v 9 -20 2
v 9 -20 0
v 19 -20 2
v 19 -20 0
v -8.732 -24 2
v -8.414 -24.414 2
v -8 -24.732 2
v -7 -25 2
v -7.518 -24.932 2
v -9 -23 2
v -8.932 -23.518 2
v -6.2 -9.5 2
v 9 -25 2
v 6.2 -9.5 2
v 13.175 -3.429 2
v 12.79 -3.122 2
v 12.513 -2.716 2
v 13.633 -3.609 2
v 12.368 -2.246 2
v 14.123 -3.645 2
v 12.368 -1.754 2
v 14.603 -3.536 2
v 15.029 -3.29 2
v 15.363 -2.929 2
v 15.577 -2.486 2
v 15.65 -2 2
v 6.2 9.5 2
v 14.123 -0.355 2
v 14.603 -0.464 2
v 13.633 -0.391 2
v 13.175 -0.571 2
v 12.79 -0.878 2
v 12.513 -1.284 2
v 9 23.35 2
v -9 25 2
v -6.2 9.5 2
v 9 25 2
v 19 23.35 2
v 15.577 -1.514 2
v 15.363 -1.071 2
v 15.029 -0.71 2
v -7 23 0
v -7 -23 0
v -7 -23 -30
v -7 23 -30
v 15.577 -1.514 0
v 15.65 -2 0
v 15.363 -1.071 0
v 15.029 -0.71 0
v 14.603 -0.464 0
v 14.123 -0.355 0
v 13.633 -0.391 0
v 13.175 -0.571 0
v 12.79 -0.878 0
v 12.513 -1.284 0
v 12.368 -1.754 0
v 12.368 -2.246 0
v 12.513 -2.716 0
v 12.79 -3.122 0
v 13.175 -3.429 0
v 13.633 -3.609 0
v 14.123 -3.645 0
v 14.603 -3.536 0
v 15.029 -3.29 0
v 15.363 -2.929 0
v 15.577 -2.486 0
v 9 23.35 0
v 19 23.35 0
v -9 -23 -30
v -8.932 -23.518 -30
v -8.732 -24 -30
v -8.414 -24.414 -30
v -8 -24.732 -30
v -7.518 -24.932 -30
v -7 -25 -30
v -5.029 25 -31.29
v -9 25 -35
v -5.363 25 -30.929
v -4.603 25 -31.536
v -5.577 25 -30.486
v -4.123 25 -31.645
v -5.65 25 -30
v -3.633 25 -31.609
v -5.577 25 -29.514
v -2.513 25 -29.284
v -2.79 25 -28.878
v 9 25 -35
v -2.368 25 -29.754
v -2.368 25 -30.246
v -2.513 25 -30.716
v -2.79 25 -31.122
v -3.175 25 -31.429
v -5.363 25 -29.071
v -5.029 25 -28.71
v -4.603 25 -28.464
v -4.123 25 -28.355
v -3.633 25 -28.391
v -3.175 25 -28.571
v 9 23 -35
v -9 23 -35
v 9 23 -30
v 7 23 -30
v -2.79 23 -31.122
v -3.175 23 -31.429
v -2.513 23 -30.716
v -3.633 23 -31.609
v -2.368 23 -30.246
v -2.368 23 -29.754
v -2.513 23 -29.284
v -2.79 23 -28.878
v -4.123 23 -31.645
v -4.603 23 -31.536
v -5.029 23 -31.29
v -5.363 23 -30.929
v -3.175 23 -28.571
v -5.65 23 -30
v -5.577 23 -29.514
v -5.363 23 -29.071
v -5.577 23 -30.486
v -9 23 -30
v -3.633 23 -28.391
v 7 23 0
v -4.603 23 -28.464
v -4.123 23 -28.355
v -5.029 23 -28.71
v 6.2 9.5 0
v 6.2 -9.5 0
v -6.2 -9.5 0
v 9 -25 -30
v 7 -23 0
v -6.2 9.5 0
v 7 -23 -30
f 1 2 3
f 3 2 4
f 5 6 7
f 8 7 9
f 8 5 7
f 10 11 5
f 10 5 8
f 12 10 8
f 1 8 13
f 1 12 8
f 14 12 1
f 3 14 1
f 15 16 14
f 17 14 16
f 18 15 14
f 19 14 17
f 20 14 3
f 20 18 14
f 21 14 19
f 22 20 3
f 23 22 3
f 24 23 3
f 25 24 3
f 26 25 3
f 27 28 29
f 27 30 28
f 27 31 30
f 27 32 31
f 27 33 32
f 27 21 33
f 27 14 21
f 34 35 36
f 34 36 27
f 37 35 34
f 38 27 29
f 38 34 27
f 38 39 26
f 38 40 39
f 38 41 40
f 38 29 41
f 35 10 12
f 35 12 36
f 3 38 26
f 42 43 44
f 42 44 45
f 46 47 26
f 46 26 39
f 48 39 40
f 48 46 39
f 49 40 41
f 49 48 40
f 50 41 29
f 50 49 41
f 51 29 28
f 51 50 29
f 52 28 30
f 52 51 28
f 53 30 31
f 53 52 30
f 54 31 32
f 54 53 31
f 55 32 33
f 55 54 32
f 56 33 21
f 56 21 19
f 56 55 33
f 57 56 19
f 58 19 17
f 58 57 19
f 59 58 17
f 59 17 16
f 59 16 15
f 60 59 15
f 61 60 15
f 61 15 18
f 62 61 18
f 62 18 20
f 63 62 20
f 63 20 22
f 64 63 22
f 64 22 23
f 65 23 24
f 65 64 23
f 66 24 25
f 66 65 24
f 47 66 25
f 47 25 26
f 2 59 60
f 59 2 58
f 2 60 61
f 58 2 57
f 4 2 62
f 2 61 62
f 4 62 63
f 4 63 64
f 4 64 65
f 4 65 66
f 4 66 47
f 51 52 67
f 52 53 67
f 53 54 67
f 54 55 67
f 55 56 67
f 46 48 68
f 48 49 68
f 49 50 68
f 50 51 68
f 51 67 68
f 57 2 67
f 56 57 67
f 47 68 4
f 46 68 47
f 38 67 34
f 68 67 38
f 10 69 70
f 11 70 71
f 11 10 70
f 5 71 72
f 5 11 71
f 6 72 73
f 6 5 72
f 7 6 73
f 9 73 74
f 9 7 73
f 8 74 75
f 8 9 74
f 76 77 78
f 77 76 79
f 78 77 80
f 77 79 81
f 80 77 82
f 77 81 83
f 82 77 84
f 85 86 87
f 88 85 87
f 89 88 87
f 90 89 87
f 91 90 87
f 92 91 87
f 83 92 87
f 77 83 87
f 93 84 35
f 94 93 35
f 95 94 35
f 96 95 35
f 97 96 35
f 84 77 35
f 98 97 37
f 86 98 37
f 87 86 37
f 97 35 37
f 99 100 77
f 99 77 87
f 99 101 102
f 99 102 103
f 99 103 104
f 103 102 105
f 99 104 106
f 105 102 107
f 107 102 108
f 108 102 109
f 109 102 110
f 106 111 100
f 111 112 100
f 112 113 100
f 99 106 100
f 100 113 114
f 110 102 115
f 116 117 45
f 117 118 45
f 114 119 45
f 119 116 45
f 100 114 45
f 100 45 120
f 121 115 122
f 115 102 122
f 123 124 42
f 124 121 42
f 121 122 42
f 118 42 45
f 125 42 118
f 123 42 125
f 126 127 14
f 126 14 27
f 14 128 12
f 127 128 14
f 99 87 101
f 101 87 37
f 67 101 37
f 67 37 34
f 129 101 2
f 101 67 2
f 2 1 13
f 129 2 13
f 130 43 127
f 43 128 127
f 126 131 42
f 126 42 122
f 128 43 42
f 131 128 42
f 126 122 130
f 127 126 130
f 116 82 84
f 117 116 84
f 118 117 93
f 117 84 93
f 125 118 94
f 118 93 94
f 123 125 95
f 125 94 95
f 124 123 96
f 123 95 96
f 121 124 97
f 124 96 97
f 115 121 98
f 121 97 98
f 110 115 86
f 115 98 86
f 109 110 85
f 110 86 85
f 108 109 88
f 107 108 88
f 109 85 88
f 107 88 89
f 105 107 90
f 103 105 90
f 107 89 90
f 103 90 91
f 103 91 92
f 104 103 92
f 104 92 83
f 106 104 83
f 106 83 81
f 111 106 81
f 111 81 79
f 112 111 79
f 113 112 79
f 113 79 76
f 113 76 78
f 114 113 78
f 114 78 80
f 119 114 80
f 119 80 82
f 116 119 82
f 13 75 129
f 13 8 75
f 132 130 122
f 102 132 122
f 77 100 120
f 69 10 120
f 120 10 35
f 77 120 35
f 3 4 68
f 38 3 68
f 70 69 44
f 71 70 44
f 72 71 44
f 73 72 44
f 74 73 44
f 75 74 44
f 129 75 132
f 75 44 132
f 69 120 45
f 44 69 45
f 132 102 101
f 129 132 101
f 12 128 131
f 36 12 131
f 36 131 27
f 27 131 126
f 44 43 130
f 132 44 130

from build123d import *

# Parameters (mm, degrees)
F0_W          = 14
F0_H          = 46
F0_W_2        = 10
F0_H_2        = 43.35
F0_R          = 1.65
F0_W_3        = 12.4
F0_H_3        = 19
F1_DEPTH      = 2
F2_DEPTH      = 30
F4_DEPTH      = 5
F5_R          = 1.65
F6_DEPTH      = 25
F6_DEPTH_BACK = 25


with BuildPart() as f1:
    # F0 (on Top) → F1 (new body)
    with BuildSketch(Plane.XY):
        with BuildLine():
            Line((9, 25), (-9, 25))
            Line((-9, 25), (-9, -23))
            ThreePointArc((-9, -23), (-8.414214, -24.414214), (-7, -25))
            Line((-7, -25), (9, -25))
            Line((9, -25), (9, -20))
            Line((9, -20), (9, 23.35))
            Line((9, 23.35), (9, 25))
        make_face()
        Rectangle(F0_W, F0_H, mode=Mode.SUBTRACT)
        with Locations((14, 1.675)):
            Rectangle(F0_W_2, F0_H_2)
        with Locations((14, -2)):
            Circle(F0_R, mode=Mode.SUBTRACT)
        Rectangle(F0_W, F0_H)
        Rectangle(F0_W_3, F0_H_3, mode=Mode.SUBTRACT)
    extrude(amount=F1_DEPTH)

    # F0 (on Top) → F2 (join)
    with BuildSketch(Plane.XY):
        with BuildLine():
            Line((9, 25), (-9, 25))
            Line((-9, 25), (-9, -23))
            ThreePointArc((-9, -23), (-8.414214, -24.414214), (-7, -25))
            Line((-7, -25), (9, -25))
            Line((9, -25), (9, -20))
            Line((9, -20), (9, 23.35))
            Line((9, 23.35), (9, 25))
        make_face()
        Rectangle(F0_W, F0_H, mode=Mode.SUBTRACT)
    extrude(amount=-F2_DEPTH)

    # F3 (on face) → F4 (join)
    with BuildSketch(Plane(origin=(0, 0, -30), x_dir=(1, 0, 0), z_dir=(0, 0, -1))):
        Polygon((-9, -23), (-9, -25), (9, -25), (9, -23), (7, -23), (-7, -23), align=None)
    extrude(amount=F4_DEPTH)

    # F5 (on face) → F6 (cut, two sides)
    with BuildSketch(Plane(origin=(0, 25, 0), x_dir=(-1, 0, 0), z_dir=(0, 1, 0))) as f6_sk:
        with Locations((4, -30)):
            Circle(F5_R)
    extrude(amount=-F6_DEPTH, mode=Mode.SUBTRACT)
    extrude(f6_sk.sketch, amount=-F6_DEPTH_BACK, mode=Mode.SUBTRACT)


solid = f1.part
